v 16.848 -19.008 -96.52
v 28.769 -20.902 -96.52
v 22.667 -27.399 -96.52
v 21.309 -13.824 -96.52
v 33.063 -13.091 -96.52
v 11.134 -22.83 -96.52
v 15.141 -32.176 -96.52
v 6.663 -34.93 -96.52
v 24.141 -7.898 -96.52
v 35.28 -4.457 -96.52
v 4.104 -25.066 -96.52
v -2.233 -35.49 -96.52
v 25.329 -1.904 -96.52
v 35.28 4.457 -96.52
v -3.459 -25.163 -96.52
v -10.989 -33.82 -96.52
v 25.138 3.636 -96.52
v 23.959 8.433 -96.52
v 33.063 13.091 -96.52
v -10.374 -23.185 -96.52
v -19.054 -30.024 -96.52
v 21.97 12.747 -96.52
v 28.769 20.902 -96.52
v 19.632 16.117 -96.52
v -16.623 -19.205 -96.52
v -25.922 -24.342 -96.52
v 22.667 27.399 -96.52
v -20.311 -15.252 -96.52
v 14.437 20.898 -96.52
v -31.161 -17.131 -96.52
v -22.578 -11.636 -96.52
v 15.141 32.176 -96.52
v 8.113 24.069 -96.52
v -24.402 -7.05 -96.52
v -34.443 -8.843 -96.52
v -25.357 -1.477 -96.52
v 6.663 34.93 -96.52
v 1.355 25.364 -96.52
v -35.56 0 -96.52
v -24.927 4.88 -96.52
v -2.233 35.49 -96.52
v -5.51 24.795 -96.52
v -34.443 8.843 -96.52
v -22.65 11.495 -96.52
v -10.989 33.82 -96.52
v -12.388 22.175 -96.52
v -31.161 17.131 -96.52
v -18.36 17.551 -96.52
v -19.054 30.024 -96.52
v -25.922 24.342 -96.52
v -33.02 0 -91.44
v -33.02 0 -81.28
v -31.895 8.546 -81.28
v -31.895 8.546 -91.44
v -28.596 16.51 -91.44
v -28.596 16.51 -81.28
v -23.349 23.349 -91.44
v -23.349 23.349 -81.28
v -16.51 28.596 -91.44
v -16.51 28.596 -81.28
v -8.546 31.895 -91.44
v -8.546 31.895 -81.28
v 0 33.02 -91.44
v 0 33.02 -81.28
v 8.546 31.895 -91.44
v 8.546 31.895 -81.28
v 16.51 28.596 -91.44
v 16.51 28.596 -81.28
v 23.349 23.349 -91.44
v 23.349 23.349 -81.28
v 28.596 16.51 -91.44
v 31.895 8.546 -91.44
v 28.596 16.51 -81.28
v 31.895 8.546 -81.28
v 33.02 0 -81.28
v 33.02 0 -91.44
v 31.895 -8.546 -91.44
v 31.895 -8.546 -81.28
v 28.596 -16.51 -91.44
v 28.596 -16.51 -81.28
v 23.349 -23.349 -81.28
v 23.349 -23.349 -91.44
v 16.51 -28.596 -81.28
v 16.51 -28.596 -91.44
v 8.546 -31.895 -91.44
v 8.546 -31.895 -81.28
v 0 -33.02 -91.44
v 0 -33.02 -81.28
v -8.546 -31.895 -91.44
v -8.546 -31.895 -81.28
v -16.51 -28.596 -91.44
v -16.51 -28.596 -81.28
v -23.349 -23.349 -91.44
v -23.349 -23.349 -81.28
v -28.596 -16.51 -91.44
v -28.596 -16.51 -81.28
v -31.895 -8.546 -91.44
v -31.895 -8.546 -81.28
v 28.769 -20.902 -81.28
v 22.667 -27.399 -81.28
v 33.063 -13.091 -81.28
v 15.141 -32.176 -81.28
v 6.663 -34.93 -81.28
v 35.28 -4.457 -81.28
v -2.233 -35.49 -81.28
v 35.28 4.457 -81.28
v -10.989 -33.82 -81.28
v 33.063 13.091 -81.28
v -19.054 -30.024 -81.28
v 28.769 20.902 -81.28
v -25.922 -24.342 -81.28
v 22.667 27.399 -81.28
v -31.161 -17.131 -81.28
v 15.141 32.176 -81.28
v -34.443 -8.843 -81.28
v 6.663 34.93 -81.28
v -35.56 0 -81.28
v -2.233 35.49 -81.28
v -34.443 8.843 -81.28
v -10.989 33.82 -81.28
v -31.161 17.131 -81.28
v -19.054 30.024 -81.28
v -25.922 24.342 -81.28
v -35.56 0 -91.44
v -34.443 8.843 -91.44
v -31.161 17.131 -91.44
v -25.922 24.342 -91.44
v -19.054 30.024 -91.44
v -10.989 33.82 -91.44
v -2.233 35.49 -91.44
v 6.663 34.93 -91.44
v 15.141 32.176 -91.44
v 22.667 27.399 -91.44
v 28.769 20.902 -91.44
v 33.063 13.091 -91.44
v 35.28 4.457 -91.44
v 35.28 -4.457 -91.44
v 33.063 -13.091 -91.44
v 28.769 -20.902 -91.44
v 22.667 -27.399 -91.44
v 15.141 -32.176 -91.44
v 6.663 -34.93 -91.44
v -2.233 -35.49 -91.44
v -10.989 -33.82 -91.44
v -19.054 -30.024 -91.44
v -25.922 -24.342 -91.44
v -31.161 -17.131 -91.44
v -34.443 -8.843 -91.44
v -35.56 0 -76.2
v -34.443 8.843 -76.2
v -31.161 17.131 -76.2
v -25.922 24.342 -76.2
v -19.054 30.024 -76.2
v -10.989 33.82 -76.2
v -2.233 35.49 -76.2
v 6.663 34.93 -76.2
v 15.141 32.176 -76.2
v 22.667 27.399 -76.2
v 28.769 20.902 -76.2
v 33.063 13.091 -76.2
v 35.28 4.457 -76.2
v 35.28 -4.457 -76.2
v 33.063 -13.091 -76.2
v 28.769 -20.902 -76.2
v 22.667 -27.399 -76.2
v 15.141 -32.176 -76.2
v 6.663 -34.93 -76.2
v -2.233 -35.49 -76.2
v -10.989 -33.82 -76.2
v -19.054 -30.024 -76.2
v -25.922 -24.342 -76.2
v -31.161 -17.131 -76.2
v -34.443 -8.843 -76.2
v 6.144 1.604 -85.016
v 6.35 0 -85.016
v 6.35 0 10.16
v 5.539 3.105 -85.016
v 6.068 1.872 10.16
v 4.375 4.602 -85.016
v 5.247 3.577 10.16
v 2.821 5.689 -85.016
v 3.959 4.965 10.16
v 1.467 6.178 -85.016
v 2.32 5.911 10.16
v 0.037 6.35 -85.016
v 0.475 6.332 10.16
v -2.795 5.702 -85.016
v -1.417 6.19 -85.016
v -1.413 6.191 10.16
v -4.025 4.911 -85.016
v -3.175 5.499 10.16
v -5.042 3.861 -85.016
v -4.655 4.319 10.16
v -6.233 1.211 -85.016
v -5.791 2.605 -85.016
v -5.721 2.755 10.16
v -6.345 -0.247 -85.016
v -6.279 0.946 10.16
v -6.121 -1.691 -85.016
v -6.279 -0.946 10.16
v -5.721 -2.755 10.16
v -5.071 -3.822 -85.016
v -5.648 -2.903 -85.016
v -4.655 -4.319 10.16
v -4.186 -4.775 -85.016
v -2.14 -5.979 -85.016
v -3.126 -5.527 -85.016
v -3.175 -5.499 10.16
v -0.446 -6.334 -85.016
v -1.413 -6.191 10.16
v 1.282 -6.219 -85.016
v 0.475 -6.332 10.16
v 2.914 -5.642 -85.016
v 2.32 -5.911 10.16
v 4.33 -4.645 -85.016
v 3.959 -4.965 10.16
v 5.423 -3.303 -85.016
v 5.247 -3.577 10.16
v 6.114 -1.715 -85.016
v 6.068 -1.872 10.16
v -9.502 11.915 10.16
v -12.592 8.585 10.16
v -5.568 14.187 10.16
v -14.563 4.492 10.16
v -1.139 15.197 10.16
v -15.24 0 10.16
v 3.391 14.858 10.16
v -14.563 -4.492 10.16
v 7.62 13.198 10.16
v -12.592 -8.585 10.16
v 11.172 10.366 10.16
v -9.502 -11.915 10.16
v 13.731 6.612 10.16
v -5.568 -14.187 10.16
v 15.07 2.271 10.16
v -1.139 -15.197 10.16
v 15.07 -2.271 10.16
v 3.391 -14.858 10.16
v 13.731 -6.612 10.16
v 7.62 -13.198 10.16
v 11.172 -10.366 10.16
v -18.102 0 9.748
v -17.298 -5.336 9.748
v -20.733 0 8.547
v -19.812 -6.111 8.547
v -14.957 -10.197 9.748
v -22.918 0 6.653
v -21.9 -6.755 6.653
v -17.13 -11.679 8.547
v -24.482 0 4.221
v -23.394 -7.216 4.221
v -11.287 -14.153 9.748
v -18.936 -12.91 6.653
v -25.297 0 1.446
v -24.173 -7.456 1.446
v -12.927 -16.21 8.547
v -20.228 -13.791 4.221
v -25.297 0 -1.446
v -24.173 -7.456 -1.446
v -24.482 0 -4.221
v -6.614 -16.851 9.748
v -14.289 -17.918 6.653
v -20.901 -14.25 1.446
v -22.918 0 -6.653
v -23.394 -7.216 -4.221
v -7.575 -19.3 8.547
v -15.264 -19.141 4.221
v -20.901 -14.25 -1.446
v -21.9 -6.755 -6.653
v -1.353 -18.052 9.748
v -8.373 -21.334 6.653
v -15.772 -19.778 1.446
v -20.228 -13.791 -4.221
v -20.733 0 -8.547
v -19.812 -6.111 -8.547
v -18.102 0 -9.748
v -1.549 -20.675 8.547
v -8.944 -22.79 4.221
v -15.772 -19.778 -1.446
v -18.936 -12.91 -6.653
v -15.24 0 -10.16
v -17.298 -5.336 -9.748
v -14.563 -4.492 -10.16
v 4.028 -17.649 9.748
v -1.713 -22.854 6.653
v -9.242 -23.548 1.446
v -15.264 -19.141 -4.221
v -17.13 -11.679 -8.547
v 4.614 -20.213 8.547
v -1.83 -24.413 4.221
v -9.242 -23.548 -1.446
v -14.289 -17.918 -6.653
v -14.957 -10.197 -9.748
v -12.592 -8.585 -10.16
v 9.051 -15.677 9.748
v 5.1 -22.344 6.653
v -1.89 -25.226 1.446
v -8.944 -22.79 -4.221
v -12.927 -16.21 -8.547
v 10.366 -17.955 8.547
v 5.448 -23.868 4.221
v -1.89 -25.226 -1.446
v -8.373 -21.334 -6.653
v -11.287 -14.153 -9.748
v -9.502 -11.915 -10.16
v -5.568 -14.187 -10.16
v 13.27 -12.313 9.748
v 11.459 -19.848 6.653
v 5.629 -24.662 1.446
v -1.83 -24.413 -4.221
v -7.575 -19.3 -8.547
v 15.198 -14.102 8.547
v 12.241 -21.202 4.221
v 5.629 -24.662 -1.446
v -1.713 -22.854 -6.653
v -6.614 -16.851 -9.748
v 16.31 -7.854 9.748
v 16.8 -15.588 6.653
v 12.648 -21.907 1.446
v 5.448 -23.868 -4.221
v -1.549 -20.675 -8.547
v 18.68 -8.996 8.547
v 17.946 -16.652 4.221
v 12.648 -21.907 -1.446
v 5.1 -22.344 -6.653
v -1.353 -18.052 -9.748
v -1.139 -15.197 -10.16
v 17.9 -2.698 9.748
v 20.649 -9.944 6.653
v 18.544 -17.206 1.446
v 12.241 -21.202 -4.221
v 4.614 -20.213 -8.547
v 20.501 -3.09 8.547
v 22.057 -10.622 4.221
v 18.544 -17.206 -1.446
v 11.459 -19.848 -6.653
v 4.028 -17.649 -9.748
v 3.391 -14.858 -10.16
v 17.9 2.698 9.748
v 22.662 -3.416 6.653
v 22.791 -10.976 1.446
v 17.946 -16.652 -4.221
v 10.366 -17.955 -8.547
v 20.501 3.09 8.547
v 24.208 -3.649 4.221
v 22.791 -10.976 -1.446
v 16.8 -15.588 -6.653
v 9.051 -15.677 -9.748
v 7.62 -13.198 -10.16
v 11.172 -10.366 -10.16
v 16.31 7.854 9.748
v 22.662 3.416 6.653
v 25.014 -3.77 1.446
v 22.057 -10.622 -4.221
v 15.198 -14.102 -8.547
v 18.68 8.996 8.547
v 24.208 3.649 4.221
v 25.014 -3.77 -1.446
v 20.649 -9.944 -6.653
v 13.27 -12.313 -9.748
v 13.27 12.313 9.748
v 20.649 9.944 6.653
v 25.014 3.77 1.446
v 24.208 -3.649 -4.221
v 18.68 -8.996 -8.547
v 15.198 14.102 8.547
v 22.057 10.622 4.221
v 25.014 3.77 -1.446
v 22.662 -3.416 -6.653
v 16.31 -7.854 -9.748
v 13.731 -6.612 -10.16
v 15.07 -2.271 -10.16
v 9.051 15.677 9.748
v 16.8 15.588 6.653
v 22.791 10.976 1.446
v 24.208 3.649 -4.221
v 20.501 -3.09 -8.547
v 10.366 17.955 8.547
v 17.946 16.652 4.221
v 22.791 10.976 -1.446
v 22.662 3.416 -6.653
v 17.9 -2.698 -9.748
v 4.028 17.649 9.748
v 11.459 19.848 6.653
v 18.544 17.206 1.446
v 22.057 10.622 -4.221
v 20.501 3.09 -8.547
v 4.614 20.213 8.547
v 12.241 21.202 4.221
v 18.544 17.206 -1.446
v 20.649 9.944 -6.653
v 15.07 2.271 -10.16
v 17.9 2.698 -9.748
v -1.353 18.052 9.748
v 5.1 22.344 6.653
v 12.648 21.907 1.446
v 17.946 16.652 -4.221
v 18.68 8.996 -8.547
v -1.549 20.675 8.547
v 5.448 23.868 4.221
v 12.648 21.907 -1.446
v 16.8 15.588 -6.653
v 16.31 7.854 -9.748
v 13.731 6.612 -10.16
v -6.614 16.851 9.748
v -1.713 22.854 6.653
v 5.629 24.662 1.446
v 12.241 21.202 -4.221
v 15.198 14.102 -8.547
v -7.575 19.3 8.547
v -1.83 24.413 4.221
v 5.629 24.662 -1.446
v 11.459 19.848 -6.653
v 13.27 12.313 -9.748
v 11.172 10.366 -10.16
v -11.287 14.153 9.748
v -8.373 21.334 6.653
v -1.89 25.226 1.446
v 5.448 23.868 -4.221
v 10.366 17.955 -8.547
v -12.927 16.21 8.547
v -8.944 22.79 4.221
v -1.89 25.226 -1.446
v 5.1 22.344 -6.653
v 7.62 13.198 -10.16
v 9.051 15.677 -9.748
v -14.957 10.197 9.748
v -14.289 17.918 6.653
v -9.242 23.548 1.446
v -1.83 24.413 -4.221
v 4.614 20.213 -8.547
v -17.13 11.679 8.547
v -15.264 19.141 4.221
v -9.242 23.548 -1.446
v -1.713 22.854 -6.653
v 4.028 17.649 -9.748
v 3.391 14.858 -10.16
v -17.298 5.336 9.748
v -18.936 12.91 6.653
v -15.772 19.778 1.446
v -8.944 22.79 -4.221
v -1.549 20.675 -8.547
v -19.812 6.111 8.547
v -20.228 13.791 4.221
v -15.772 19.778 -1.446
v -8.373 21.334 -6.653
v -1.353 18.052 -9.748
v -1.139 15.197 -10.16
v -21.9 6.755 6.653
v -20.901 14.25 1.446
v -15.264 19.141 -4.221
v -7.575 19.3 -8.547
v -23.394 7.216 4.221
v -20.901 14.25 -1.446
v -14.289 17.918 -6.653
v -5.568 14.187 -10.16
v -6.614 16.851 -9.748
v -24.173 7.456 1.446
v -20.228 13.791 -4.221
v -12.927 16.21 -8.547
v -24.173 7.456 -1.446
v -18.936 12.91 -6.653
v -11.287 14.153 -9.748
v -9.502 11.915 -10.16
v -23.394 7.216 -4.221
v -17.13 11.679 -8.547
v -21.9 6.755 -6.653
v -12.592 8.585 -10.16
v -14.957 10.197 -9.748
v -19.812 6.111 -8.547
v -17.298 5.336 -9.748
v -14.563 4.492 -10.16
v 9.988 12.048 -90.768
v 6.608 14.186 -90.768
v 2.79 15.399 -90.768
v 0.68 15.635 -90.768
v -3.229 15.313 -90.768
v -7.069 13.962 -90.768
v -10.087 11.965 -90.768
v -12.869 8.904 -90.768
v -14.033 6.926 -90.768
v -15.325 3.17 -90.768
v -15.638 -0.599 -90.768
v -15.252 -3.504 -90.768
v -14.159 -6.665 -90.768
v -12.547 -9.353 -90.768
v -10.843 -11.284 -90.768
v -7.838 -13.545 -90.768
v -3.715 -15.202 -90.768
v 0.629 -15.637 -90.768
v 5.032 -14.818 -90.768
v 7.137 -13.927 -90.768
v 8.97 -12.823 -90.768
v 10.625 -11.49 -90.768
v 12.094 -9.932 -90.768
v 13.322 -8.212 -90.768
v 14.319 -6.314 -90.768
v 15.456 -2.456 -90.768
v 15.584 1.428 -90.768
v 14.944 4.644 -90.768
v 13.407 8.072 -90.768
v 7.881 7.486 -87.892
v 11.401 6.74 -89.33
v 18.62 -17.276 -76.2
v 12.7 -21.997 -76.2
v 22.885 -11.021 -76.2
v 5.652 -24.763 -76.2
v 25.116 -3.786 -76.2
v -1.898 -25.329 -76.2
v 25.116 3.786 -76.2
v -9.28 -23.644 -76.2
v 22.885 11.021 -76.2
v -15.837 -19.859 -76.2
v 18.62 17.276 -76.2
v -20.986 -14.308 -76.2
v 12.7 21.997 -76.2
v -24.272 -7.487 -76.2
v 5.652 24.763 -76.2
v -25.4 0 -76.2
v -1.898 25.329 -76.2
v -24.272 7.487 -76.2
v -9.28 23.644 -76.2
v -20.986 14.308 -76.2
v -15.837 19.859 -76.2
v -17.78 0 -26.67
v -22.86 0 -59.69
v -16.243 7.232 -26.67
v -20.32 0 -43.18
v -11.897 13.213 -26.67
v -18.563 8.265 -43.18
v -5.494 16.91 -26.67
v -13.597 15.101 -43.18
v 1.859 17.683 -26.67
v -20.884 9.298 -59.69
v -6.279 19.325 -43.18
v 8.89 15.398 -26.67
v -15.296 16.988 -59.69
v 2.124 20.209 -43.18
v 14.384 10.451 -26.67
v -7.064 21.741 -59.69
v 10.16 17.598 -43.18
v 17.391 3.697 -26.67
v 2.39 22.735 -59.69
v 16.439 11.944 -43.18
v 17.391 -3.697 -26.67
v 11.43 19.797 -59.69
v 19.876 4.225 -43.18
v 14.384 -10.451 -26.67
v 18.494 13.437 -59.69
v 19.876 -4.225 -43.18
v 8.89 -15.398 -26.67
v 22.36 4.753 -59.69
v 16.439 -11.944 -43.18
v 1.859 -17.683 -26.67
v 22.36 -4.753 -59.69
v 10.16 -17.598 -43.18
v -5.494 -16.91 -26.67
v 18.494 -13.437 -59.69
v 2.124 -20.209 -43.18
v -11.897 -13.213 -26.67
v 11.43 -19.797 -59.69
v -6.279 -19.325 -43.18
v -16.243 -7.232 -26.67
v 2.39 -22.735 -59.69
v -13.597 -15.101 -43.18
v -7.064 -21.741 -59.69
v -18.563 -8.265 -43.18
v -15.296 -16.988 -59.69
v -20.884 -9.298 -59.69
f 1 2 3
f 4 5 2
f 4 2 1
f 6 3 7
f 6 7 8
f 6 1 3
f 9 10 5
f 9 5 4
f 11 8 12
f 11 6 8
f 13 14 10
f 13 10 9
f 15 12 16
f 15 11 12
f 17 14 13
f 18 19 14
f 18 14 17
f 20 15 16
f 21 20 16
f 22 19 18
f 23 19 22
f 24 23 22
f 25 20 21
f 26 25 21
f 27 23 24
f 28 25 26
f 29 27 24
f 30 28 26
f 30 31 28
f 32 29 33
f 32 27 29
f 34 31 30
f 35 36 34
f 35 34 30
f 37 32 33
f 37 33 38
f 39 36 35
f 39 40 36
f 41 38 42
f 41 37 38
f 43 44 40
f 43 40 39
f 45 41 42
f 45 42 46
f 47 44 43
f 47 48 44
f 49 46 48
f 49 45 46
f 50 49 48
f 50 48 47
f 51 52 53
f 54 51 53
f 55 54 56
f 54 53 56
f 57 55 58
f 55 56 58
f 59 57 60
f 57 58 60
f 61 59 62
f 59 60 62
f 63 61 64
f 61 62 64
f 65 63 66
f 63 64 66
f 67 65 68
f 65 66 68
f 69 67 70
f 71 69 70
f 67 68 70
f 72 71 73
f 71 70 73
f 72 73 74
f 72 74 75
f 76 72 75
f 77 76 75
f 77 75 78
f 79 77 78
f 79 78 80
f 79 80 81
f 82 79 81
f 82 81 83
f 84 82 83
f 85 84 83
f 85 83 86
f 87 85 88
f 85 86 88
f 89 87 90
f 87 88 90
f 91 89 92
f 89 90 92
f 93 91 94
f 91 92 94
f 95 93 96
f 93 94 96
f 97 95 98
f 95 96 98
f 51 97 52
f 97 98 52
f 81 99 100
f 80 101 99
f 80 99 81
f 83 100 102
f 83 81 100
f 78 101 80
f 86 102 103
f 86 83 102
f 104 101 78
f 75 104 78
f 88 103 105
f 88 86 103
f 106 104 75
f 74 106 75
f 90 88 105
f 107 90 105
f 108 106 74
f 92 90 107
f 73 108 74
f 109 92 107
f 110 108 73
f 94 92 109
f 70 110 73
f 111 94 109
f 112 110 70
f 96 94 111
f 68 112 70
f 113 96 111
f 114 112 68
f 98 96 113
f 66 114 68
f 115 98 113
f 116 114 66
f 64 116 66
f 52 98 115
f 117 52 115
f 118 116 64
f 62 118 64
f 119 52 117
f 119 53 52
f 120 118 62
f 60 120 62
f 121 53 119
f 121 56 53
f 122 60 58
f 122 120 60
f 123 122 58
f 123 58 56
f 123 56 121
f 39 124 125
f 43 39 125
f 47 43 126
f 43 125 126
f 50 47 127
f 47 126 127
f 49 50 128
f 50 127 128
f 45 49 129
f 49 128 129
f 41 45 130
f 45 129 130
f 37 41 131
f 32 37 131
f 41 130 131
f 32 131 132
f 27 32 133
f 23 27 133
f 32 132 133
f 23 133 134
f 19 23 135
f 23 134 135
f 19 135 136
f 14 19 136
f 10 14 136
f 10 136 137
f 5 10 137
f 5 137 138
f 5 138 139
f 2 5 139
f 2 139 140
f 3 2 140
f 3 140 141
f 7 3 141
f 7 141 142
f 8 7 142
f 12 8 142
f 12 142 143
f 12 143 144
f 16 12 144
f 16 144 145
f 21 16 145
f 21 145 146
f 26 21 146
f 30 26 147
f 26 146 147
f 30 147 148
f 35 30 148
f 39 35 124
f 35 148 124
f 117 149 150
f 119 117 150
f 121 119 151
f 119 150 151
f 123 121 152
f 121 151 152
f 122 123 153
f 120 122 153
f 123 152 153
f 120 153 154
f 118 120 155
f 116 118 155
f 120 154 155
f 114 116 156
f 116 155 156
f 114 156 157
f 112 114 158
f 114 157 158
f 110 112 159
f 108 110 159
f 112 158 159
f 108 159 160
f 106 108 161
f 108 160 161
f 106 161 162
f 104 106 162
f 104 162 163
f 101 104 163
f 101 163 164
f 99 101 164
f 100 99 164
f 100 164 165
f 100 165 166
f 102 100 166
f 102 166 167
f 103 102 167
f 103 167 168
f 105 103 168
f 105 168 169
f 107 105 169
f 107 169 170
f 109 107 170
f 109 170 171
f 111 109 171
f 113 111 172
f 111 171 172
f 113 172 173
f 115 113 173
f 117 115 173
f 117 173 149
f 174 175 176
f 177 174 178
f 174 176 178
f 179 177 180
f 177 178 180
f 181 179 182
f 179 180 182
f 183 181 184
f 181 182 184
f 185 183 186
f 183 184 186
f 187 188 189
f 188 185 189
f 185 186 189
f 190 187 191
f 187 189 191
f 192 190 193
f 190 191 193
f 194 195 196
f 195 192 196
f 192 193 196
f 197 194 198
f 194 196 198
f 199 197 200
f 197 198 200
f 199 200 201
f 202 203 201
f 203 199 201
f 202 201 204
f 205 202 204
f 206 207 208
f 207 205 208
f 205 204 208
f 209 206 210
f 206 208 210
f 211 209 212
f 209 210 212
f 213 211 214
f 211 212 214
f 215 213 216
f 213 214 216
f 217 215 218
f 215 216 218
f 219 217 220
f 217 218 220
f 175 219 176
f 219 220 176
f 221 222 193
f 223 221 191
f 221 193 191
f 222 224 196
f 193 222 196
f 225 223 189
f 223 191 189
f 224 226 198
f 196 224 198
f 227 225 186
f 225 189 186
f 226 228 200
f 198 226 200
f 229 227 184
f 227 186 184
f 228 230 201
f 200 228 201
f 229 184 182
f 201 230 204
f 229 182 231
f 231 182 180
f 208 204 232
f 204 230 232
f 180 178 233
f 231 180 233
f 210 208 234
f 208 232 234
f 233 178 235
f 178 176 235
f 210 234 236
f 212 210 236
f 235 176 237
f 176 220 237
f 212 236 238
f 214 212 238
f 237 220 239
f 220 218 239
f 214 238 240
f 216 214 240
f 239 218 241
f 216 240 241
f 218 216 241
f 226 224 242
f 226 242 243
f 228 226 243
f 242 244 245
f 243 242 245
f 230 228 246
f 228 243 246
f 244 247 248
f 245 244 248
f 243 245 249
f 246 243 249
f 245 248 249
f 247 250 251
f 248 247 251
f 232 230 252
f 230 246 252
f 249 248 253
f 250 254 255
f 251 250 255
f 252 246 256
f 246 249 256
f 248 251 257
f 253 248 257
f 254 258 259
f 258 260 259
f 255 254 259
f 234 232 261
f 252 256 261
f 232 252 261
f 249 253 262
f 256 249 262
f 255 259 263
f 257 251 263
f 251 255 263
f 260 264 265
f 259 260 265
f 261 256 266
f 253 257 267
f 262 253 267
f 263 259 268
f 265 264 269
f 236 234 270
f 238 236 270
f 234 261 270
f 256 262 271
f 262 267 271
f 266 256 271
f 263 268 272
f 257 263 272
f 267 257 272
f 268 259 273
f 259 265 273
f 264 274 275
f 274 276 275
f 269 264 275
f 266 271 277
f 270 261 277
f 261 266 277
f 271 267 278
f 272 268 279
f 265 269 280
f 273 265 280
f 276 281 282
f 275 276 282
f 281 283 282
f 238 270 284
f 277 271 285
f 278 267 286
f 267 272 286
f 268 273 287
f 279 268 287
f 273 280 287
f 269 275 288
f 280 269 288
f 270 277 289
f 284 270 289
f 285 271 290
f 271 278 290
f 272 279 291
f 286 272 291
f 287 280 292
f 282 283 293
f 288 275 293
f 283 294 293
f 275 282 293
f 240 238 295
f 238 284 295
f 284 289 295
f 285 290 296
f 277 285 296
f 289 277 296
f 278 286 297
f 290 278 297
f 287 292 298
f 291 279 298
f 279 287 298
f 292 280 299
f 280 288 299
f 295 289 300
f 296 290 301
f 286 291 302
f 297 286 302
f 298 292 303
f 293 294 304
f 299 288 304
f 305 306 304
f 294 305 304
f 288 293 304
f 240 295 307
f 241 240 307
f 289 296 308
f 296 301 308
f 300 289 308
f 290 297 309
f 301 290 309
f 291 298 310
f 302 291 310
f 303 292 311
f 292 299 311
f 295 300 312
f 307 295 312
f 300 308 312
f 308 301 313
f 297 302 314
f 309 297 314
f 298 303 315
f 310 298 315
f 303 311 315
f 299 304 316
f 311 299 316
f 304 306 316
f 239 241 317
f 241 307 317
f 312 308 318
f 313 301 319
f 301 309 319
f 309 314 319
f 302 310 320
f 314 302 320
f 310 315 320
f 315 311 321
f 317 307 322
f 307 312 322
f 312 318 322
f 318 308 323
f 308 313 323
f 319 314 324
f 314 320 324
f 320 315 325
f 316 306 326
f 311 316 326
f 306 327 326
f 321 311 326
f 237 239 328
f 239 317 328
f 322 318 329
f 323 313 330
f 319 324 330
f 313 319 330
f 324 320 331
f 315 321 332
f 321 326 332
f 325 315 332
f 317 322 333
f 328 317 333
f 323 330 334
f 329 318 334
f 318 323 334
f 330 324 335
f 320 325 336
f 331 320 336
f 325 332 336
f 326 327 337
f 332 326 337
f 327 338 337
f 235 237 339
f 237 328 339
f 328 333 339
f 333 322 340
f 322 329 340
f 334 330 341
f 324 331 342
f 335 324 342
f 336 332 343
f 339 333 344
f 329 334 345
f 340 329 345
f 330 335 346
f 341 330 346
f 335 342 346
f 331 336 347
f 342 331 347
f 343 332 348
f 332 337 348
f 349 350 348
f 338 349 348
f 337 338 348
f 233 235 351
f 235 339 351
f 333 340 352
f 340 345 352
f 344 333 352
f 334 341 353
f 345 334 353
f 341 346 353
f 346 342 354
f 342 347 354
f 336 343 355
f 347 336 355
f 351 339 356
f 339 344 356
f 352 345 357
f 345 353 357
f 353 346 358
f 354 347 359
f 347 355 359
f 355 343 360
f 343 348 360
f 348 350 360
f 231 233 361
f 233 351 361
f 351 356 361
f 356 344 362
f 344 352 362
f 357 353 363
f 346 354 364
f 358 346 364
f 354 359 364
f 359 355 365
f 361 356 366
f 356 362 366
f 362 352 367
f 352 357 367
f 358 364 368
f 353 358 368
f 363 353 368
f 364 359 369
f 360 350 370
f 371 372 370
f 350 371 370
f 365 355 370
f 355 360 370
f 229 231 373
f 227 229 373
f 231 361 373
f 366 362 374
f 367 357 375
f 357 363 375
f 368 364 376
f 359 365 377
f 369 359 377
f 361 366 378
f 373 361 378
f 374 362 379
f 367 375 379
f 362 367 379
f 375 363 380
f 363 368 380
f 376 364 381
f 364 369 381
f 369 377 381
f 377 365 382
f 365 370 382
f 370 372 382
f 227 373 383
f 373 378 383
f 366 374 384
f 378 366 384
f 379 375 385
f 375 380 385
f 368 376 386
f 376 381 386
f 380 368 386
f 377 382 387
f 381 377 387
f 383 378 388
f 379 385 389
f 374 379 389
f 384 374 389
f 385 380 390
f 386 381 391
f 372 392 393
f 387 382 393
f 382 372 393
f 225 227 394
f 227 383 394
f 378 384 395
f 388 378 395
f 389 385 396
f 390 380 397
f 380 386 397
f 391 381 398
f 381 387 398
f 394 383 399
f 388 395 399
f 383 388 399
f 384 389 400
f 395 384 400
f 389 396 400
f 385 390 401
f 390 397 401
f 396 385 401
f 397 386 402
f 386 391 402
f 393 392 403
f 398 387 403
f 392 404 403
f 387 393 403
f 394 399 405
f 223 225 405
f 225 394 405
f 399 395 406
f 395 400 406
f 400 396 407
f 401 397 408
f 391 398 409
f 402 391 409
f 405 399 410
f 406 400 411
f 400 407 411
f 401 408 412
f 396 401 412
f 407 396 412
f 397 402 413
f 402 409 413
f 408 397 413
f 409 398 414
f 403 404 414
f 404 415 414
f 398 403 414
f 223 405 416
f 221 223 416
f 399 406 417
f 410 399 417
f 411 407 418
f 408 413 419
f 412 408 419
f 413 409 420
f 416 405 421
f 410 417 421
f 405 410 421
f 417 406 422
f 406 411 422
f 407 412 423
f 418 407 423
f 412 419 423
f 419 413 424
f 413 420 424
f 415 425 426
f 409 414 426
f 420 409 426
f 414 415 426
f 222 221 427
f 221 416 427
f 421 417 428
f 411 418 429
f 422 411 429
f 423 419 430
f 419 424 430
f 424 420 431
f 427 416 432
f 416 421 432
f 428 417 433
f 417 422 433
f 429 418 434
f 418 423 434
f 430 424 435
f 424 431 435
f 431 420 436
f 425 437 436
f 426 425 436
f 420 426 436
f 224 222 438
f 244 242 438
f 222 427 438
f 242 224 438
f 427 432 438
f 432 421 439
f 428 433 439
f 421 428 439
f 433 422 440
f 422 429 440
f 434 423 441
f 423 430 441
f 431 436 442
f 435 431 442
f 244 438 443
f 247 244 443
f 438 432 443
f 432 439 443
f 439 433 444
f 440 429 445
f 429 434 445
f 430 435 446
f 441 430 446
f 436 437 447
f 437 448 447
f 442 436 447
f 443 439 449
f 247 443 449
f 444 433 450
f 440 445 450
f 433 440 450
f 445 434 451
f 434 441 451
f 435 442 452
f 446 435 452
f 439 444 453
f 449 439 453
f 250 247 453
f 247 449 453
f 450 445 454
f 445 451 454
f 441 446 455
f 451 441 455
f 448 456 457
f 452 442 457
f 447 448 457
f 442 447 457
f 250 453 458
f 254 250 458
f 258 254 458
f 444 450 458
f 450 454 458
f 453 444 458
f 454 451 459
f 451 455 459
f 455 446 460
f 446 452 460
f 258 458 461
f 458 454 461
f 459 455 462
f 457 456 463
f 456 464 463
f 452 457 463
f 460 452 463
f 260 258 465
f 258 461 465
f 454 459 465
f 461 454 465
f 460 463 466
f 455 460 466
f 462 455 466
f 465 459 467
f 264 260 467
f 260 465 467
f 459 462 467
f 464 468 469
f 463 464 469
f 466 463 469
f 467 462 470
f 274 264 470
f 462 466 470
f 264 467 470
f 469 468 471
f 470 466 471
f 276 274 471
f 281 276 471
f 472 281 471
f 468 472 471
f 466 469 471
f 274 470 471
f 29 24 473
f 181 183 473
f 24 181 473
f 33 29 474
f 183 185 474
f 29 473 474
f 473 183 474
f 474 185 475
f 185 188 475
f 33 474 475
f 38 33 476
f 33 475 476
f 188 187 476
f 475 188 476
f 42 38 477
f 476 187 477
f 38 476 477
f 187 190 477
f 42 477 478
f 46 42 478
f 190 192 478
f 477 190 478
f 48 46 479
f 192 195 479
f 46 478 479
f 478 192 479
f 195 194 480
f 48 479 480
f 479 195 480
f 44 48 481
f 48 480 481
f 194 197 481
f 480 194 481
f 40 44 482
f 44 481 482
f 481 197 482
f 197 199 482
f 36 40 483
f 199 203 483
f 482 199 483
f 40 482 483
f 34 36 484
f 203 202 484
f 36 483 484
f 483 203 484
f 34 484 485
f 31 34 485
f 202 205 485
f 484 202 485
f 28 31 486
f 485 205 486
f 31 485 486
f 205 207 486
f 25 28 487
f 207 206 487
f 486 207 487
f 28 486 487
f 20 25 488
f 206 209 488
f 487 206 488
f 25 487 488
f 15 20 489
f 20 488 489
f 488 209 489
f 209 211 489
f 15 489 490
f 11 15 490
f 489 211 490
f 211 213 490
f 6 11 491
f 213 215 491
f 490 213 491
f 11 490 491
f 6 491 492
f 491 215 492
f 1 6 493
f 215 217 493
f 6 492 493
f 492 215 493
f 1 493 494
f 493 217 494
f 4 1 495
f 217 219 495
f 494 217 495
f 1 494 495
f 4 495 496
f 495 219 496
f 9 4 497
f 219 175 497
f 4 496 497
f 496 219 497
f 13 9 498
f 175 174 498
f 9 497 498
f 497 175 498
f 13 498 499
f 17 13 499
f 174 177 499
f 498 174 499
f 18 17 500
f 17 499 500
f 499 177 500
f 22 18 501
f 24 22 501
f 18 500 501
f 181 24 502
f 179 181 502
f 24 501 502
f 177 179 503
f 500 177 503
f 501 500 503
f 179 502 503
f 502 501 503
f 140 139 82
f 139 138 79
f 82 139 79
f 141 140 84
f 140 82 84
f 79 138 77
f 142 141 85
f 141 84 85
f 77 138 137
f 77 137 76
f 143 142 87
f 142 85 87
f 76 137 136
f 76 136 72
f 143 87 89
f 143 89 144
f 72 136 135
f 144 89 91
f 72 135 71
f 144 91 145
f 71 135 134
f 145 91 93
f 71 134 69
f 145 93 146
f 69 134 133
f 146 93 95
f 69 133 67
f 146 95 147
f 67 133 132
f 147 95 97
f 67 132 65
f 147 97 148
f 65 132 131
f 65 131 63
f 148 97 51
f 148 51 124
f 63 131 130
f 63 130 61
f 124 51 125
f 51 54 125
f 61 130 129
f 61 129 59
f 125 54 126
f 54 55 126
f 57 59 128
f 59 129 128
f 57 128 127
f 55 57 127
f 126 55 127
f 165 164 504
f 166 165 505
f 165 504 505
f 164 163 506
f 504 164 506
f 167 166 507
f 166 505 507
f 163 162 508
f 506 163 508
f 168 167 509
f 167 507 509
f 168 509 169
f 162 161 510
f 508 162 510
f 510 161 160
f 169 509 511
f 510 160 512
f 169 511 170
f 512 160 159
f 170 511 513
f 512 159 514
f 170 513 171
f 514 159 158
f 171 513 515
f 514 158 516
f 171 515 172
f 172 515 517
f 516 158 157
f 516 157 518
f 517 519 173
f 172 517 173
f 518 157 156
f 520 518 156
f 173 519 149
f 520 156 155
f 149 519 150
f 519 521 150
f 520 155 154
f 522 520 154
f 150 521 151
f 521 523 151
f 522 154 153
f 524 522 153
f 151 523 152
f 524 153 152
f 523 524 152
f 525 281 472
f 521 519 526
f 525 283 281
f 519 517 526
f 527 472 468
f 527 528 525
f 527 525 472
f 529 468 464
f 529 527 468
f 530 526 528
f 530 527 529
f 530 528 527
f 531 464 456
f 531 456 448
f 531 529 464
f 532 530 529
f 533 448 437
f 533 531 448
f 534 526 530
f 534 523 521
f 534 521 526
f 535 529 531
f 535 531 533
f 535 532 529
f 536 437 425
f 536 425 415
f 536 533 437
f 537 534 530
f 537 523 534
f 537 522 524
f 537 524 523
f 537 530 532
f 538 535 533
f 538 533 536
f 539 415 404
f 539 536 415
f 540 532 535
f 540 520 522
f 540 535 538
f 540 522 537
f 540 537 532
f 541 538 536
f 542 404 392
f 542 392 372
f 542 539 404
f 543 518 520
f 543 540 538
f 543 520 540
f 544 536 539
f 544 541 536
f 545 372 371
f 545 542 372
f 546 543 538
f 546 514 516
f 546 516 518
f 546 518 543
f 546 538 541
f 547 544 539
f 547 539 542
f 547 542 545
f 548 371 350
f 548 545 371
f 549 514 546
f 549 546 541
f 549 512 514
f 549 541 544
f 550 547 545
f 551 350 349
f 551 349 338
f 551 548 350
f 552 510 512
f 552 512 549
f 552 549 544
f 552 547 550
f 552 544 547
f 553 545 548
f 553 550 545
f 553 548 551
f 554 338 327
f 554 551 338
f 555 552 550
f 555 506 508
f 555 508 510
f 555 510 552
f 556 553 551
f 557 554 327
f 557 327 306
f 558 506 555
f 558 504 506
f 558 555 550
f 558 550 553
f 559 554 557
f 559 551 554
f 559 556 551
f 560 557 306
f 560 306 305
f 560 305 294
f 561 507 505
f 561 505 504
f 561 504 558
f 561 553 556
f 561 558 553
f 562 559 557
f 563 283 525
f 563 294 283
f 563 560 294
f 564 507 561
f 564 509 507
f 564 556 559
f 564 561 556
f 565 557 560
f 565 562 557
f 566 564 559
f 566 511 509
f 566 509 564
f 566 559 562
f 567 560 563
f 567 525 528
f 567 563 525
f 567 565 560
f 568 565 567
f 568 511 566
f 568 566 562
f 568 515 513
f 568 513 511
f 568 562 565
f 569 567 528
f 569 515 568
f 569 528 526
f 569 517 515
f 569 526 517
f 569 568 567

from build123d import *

# Parameters (mm, degrees)
SKETCH5_R           = 15.24
SKETCH6_R           = 25.4
SKETCH7_R           = 35.56
BOSS_EXTRUDE1_DEPTH = 20.32
CUT_EXTRUDE4_START  = -10.16
SKETCH8_R           = 35.56
SKETCH8_R_2         = 33.02
CUT_EXTRUDE4_DEPTH  = 10.16
SKETCH9_R           = 30.48
CUT_EXTRUDE5_DEPTH  = 17.78
SKETCH4_R           = 6.35
CUT_EXTRUDE6_DEPTH  = 118.939177545
FILLET1_R           = 2.54
BOSS_EXTRUDE2_START = 17.78
SKETCH12_R          = 30.48
BOSS_EXTRUDE2_DEPTH = 17.78
SKETCH14_R          = 6.35
CUT_EXTRUDE7_DEPTH  = 118.939177696


with BuildPart() as part:
    # Sketch3 → Revolve1 (revolve)
    with BuildSketch(Plane(origin=(0, 0, 0), x_dir=(1, 0, 0), z_dir=(0, 1, 0)), mode=Mode.PRIVATE) as revolve1_sk:
        with BuildLine():
            Line((0, 10.16), (0, -10.16))
            Line((0, -10.16), (15.24, -10.16))
            ThreePointArc((15.24, -10.16), (25.4, 0), (15.24, 10.16))
            Line((15.24, 10.16), (0, 10.16))
        make_face()
    revolve(revolve1_sk.sketch.rotate(Axis((0, 0, -50.309770133), (0, 0, 1)), 180), axis=Axis((0, 0, -50.309770133), (0, 0, 1)))

    # Sketch5 → Loft1 section 0
    with BuildSketch(Plane(origin=(0, 0, -10.16), x_dir=(-1, 0, 0), z_dir=(0, 0, -1))):
        Circle(SKETCH5_R)
    # Sketch6 → Loft1 section 1
    with BuildSketch(Plane.XY.offset(-76.2)):
        Circle(SKETCH6_R)
    loft()

    # Sketch7 → Boss-Extrude1 (add)
    with BuildSketch(Plane(origin=(0, 0, -76.2), x_dir=(-1, 0, 0), z_dir=(0, 0, -1))):
        Circle(SKETCH7_R)
    extrude(amount=BOSS_EXTRUDE1_DEPTH)

    # Sketch8 → Cut-Extrude4 (cut)
    with BuildSketch(Plane(origin=(0, 0, -91.44), x_dir=(-1, 0, 0), z_dir=(0, 0, -1)).offset(CUT_EXTRUDE4_START)):
        Circle(SKETCH8_R)
        Circle(SKETCH8_R_2, mode=Mode.SUBTRACT)
    extrude(amount=CUT_EXTRUDE4_DEPTH, mode=Mode.SUBTRACT)

    # Sketch9 → Cut-Extrude5 (cut)
    with BuildSketch(Plane(origin=(0, 0, -96.52), x_dir=(-1, 0, 0), z_dir=(0, 0, -1))):
        Circle(SKETCH9_R)
    extrude(amount=-CUT_EXTRUDE5_DEPTH, mode=Mode.SUBTRACT)

    # Sketch4 → Cut-Extrude6 (cut, through all)
    with BuildSketch(Plane.XY.offset(10.16)):
        Circle(SKETCH4_R)
    extrude(amount=-CUT_EXTRUDE6_DEPTH, mode=Mode.SUBTRACT)

    # Fillet1
    fillet1_edges = [part.edges().sort_by_distance(p)[0] for p in [
        (30.48, 0, -78.74),
    ]]
    fillet(fillet1_edges, radius=FILLET1_R)

    # Sketch12 → Boss-Extrude2 (add)
    with BuildSketch(Plane(origin=(0, 0, -78.74), x_dir=(-1, 0, 0), z_dir=(0, 0, -1)).offset(BOSS_EXTRUDE2_START)):
        Circle(SKETCH12_R)
    extrude(amount=-BOSS_EXTRUDE2_DEPTH)

    # Cut-Loft2: read off the stored shape, not the designer's step
    # Cut-Loft2: loft between two sections, ruled curve by curve
    cut_loft2_from = [
        Edge.make_bspline([(19.631934156, 16.116673394, -96.52), (-12.601412631, 55.380541707, -96.52), (-51.865280944, 23.147194919, -96.52), (-19.631934156, -16.116673394, -96.52), (12.601412631, -55.380541707, -96.52), (51.865280944, -23.147194919, -96.52), (19.631934156, 16.116673394, -96.52)], [0, 0, 0, 0, 0.5, 0.5, 0.5, 1, 1, 1, 1], 3, [1, 0.333333333, 0.333333333, 1, 0.333333333, 0.333333333, 1]),
    ]
    cut_loft2_to = [
        Edge.make_bspline([(-6.35, 0, -78.74), (-6.35, -12.7, -78.74), (6.35, -12.7, -78.74), (6.35, 0, -78.74), (6.35, 12.7, -78.74), (-6.35, 12.7, -78.74), (-6.35, 0, -78.74)], [0, 0, 0, 0, 0.5, 0.5, 0.5, 1, 1, 1, 1], 3, [1, 0.333333333, 0.333333333, 1, 0.333333333, 0.333333333, 1]),
    ]
    cut_loft2 = Solid(Shell([*[Face.make_surface_from_curves(cut_loft2_from[k], cut_loft2_to[k]) for k in range(1)], Face(Wire(cut_loft2_from)), Face(Wire(cut_loft2_to))]))
    add(cut_loft2, mode=Mode.SUBTRACT)

    # Sketch14 → Cut-Extrude7 (cut, through all)
    with BuildSketch(Plane.XY.offset(10.16)):
        Circle(SKETCH14_R)
    extrude(amount=-CUT_EXTRUDE7_DEPTH, mode=Mode.SUBTRACT)


solid = part.part
